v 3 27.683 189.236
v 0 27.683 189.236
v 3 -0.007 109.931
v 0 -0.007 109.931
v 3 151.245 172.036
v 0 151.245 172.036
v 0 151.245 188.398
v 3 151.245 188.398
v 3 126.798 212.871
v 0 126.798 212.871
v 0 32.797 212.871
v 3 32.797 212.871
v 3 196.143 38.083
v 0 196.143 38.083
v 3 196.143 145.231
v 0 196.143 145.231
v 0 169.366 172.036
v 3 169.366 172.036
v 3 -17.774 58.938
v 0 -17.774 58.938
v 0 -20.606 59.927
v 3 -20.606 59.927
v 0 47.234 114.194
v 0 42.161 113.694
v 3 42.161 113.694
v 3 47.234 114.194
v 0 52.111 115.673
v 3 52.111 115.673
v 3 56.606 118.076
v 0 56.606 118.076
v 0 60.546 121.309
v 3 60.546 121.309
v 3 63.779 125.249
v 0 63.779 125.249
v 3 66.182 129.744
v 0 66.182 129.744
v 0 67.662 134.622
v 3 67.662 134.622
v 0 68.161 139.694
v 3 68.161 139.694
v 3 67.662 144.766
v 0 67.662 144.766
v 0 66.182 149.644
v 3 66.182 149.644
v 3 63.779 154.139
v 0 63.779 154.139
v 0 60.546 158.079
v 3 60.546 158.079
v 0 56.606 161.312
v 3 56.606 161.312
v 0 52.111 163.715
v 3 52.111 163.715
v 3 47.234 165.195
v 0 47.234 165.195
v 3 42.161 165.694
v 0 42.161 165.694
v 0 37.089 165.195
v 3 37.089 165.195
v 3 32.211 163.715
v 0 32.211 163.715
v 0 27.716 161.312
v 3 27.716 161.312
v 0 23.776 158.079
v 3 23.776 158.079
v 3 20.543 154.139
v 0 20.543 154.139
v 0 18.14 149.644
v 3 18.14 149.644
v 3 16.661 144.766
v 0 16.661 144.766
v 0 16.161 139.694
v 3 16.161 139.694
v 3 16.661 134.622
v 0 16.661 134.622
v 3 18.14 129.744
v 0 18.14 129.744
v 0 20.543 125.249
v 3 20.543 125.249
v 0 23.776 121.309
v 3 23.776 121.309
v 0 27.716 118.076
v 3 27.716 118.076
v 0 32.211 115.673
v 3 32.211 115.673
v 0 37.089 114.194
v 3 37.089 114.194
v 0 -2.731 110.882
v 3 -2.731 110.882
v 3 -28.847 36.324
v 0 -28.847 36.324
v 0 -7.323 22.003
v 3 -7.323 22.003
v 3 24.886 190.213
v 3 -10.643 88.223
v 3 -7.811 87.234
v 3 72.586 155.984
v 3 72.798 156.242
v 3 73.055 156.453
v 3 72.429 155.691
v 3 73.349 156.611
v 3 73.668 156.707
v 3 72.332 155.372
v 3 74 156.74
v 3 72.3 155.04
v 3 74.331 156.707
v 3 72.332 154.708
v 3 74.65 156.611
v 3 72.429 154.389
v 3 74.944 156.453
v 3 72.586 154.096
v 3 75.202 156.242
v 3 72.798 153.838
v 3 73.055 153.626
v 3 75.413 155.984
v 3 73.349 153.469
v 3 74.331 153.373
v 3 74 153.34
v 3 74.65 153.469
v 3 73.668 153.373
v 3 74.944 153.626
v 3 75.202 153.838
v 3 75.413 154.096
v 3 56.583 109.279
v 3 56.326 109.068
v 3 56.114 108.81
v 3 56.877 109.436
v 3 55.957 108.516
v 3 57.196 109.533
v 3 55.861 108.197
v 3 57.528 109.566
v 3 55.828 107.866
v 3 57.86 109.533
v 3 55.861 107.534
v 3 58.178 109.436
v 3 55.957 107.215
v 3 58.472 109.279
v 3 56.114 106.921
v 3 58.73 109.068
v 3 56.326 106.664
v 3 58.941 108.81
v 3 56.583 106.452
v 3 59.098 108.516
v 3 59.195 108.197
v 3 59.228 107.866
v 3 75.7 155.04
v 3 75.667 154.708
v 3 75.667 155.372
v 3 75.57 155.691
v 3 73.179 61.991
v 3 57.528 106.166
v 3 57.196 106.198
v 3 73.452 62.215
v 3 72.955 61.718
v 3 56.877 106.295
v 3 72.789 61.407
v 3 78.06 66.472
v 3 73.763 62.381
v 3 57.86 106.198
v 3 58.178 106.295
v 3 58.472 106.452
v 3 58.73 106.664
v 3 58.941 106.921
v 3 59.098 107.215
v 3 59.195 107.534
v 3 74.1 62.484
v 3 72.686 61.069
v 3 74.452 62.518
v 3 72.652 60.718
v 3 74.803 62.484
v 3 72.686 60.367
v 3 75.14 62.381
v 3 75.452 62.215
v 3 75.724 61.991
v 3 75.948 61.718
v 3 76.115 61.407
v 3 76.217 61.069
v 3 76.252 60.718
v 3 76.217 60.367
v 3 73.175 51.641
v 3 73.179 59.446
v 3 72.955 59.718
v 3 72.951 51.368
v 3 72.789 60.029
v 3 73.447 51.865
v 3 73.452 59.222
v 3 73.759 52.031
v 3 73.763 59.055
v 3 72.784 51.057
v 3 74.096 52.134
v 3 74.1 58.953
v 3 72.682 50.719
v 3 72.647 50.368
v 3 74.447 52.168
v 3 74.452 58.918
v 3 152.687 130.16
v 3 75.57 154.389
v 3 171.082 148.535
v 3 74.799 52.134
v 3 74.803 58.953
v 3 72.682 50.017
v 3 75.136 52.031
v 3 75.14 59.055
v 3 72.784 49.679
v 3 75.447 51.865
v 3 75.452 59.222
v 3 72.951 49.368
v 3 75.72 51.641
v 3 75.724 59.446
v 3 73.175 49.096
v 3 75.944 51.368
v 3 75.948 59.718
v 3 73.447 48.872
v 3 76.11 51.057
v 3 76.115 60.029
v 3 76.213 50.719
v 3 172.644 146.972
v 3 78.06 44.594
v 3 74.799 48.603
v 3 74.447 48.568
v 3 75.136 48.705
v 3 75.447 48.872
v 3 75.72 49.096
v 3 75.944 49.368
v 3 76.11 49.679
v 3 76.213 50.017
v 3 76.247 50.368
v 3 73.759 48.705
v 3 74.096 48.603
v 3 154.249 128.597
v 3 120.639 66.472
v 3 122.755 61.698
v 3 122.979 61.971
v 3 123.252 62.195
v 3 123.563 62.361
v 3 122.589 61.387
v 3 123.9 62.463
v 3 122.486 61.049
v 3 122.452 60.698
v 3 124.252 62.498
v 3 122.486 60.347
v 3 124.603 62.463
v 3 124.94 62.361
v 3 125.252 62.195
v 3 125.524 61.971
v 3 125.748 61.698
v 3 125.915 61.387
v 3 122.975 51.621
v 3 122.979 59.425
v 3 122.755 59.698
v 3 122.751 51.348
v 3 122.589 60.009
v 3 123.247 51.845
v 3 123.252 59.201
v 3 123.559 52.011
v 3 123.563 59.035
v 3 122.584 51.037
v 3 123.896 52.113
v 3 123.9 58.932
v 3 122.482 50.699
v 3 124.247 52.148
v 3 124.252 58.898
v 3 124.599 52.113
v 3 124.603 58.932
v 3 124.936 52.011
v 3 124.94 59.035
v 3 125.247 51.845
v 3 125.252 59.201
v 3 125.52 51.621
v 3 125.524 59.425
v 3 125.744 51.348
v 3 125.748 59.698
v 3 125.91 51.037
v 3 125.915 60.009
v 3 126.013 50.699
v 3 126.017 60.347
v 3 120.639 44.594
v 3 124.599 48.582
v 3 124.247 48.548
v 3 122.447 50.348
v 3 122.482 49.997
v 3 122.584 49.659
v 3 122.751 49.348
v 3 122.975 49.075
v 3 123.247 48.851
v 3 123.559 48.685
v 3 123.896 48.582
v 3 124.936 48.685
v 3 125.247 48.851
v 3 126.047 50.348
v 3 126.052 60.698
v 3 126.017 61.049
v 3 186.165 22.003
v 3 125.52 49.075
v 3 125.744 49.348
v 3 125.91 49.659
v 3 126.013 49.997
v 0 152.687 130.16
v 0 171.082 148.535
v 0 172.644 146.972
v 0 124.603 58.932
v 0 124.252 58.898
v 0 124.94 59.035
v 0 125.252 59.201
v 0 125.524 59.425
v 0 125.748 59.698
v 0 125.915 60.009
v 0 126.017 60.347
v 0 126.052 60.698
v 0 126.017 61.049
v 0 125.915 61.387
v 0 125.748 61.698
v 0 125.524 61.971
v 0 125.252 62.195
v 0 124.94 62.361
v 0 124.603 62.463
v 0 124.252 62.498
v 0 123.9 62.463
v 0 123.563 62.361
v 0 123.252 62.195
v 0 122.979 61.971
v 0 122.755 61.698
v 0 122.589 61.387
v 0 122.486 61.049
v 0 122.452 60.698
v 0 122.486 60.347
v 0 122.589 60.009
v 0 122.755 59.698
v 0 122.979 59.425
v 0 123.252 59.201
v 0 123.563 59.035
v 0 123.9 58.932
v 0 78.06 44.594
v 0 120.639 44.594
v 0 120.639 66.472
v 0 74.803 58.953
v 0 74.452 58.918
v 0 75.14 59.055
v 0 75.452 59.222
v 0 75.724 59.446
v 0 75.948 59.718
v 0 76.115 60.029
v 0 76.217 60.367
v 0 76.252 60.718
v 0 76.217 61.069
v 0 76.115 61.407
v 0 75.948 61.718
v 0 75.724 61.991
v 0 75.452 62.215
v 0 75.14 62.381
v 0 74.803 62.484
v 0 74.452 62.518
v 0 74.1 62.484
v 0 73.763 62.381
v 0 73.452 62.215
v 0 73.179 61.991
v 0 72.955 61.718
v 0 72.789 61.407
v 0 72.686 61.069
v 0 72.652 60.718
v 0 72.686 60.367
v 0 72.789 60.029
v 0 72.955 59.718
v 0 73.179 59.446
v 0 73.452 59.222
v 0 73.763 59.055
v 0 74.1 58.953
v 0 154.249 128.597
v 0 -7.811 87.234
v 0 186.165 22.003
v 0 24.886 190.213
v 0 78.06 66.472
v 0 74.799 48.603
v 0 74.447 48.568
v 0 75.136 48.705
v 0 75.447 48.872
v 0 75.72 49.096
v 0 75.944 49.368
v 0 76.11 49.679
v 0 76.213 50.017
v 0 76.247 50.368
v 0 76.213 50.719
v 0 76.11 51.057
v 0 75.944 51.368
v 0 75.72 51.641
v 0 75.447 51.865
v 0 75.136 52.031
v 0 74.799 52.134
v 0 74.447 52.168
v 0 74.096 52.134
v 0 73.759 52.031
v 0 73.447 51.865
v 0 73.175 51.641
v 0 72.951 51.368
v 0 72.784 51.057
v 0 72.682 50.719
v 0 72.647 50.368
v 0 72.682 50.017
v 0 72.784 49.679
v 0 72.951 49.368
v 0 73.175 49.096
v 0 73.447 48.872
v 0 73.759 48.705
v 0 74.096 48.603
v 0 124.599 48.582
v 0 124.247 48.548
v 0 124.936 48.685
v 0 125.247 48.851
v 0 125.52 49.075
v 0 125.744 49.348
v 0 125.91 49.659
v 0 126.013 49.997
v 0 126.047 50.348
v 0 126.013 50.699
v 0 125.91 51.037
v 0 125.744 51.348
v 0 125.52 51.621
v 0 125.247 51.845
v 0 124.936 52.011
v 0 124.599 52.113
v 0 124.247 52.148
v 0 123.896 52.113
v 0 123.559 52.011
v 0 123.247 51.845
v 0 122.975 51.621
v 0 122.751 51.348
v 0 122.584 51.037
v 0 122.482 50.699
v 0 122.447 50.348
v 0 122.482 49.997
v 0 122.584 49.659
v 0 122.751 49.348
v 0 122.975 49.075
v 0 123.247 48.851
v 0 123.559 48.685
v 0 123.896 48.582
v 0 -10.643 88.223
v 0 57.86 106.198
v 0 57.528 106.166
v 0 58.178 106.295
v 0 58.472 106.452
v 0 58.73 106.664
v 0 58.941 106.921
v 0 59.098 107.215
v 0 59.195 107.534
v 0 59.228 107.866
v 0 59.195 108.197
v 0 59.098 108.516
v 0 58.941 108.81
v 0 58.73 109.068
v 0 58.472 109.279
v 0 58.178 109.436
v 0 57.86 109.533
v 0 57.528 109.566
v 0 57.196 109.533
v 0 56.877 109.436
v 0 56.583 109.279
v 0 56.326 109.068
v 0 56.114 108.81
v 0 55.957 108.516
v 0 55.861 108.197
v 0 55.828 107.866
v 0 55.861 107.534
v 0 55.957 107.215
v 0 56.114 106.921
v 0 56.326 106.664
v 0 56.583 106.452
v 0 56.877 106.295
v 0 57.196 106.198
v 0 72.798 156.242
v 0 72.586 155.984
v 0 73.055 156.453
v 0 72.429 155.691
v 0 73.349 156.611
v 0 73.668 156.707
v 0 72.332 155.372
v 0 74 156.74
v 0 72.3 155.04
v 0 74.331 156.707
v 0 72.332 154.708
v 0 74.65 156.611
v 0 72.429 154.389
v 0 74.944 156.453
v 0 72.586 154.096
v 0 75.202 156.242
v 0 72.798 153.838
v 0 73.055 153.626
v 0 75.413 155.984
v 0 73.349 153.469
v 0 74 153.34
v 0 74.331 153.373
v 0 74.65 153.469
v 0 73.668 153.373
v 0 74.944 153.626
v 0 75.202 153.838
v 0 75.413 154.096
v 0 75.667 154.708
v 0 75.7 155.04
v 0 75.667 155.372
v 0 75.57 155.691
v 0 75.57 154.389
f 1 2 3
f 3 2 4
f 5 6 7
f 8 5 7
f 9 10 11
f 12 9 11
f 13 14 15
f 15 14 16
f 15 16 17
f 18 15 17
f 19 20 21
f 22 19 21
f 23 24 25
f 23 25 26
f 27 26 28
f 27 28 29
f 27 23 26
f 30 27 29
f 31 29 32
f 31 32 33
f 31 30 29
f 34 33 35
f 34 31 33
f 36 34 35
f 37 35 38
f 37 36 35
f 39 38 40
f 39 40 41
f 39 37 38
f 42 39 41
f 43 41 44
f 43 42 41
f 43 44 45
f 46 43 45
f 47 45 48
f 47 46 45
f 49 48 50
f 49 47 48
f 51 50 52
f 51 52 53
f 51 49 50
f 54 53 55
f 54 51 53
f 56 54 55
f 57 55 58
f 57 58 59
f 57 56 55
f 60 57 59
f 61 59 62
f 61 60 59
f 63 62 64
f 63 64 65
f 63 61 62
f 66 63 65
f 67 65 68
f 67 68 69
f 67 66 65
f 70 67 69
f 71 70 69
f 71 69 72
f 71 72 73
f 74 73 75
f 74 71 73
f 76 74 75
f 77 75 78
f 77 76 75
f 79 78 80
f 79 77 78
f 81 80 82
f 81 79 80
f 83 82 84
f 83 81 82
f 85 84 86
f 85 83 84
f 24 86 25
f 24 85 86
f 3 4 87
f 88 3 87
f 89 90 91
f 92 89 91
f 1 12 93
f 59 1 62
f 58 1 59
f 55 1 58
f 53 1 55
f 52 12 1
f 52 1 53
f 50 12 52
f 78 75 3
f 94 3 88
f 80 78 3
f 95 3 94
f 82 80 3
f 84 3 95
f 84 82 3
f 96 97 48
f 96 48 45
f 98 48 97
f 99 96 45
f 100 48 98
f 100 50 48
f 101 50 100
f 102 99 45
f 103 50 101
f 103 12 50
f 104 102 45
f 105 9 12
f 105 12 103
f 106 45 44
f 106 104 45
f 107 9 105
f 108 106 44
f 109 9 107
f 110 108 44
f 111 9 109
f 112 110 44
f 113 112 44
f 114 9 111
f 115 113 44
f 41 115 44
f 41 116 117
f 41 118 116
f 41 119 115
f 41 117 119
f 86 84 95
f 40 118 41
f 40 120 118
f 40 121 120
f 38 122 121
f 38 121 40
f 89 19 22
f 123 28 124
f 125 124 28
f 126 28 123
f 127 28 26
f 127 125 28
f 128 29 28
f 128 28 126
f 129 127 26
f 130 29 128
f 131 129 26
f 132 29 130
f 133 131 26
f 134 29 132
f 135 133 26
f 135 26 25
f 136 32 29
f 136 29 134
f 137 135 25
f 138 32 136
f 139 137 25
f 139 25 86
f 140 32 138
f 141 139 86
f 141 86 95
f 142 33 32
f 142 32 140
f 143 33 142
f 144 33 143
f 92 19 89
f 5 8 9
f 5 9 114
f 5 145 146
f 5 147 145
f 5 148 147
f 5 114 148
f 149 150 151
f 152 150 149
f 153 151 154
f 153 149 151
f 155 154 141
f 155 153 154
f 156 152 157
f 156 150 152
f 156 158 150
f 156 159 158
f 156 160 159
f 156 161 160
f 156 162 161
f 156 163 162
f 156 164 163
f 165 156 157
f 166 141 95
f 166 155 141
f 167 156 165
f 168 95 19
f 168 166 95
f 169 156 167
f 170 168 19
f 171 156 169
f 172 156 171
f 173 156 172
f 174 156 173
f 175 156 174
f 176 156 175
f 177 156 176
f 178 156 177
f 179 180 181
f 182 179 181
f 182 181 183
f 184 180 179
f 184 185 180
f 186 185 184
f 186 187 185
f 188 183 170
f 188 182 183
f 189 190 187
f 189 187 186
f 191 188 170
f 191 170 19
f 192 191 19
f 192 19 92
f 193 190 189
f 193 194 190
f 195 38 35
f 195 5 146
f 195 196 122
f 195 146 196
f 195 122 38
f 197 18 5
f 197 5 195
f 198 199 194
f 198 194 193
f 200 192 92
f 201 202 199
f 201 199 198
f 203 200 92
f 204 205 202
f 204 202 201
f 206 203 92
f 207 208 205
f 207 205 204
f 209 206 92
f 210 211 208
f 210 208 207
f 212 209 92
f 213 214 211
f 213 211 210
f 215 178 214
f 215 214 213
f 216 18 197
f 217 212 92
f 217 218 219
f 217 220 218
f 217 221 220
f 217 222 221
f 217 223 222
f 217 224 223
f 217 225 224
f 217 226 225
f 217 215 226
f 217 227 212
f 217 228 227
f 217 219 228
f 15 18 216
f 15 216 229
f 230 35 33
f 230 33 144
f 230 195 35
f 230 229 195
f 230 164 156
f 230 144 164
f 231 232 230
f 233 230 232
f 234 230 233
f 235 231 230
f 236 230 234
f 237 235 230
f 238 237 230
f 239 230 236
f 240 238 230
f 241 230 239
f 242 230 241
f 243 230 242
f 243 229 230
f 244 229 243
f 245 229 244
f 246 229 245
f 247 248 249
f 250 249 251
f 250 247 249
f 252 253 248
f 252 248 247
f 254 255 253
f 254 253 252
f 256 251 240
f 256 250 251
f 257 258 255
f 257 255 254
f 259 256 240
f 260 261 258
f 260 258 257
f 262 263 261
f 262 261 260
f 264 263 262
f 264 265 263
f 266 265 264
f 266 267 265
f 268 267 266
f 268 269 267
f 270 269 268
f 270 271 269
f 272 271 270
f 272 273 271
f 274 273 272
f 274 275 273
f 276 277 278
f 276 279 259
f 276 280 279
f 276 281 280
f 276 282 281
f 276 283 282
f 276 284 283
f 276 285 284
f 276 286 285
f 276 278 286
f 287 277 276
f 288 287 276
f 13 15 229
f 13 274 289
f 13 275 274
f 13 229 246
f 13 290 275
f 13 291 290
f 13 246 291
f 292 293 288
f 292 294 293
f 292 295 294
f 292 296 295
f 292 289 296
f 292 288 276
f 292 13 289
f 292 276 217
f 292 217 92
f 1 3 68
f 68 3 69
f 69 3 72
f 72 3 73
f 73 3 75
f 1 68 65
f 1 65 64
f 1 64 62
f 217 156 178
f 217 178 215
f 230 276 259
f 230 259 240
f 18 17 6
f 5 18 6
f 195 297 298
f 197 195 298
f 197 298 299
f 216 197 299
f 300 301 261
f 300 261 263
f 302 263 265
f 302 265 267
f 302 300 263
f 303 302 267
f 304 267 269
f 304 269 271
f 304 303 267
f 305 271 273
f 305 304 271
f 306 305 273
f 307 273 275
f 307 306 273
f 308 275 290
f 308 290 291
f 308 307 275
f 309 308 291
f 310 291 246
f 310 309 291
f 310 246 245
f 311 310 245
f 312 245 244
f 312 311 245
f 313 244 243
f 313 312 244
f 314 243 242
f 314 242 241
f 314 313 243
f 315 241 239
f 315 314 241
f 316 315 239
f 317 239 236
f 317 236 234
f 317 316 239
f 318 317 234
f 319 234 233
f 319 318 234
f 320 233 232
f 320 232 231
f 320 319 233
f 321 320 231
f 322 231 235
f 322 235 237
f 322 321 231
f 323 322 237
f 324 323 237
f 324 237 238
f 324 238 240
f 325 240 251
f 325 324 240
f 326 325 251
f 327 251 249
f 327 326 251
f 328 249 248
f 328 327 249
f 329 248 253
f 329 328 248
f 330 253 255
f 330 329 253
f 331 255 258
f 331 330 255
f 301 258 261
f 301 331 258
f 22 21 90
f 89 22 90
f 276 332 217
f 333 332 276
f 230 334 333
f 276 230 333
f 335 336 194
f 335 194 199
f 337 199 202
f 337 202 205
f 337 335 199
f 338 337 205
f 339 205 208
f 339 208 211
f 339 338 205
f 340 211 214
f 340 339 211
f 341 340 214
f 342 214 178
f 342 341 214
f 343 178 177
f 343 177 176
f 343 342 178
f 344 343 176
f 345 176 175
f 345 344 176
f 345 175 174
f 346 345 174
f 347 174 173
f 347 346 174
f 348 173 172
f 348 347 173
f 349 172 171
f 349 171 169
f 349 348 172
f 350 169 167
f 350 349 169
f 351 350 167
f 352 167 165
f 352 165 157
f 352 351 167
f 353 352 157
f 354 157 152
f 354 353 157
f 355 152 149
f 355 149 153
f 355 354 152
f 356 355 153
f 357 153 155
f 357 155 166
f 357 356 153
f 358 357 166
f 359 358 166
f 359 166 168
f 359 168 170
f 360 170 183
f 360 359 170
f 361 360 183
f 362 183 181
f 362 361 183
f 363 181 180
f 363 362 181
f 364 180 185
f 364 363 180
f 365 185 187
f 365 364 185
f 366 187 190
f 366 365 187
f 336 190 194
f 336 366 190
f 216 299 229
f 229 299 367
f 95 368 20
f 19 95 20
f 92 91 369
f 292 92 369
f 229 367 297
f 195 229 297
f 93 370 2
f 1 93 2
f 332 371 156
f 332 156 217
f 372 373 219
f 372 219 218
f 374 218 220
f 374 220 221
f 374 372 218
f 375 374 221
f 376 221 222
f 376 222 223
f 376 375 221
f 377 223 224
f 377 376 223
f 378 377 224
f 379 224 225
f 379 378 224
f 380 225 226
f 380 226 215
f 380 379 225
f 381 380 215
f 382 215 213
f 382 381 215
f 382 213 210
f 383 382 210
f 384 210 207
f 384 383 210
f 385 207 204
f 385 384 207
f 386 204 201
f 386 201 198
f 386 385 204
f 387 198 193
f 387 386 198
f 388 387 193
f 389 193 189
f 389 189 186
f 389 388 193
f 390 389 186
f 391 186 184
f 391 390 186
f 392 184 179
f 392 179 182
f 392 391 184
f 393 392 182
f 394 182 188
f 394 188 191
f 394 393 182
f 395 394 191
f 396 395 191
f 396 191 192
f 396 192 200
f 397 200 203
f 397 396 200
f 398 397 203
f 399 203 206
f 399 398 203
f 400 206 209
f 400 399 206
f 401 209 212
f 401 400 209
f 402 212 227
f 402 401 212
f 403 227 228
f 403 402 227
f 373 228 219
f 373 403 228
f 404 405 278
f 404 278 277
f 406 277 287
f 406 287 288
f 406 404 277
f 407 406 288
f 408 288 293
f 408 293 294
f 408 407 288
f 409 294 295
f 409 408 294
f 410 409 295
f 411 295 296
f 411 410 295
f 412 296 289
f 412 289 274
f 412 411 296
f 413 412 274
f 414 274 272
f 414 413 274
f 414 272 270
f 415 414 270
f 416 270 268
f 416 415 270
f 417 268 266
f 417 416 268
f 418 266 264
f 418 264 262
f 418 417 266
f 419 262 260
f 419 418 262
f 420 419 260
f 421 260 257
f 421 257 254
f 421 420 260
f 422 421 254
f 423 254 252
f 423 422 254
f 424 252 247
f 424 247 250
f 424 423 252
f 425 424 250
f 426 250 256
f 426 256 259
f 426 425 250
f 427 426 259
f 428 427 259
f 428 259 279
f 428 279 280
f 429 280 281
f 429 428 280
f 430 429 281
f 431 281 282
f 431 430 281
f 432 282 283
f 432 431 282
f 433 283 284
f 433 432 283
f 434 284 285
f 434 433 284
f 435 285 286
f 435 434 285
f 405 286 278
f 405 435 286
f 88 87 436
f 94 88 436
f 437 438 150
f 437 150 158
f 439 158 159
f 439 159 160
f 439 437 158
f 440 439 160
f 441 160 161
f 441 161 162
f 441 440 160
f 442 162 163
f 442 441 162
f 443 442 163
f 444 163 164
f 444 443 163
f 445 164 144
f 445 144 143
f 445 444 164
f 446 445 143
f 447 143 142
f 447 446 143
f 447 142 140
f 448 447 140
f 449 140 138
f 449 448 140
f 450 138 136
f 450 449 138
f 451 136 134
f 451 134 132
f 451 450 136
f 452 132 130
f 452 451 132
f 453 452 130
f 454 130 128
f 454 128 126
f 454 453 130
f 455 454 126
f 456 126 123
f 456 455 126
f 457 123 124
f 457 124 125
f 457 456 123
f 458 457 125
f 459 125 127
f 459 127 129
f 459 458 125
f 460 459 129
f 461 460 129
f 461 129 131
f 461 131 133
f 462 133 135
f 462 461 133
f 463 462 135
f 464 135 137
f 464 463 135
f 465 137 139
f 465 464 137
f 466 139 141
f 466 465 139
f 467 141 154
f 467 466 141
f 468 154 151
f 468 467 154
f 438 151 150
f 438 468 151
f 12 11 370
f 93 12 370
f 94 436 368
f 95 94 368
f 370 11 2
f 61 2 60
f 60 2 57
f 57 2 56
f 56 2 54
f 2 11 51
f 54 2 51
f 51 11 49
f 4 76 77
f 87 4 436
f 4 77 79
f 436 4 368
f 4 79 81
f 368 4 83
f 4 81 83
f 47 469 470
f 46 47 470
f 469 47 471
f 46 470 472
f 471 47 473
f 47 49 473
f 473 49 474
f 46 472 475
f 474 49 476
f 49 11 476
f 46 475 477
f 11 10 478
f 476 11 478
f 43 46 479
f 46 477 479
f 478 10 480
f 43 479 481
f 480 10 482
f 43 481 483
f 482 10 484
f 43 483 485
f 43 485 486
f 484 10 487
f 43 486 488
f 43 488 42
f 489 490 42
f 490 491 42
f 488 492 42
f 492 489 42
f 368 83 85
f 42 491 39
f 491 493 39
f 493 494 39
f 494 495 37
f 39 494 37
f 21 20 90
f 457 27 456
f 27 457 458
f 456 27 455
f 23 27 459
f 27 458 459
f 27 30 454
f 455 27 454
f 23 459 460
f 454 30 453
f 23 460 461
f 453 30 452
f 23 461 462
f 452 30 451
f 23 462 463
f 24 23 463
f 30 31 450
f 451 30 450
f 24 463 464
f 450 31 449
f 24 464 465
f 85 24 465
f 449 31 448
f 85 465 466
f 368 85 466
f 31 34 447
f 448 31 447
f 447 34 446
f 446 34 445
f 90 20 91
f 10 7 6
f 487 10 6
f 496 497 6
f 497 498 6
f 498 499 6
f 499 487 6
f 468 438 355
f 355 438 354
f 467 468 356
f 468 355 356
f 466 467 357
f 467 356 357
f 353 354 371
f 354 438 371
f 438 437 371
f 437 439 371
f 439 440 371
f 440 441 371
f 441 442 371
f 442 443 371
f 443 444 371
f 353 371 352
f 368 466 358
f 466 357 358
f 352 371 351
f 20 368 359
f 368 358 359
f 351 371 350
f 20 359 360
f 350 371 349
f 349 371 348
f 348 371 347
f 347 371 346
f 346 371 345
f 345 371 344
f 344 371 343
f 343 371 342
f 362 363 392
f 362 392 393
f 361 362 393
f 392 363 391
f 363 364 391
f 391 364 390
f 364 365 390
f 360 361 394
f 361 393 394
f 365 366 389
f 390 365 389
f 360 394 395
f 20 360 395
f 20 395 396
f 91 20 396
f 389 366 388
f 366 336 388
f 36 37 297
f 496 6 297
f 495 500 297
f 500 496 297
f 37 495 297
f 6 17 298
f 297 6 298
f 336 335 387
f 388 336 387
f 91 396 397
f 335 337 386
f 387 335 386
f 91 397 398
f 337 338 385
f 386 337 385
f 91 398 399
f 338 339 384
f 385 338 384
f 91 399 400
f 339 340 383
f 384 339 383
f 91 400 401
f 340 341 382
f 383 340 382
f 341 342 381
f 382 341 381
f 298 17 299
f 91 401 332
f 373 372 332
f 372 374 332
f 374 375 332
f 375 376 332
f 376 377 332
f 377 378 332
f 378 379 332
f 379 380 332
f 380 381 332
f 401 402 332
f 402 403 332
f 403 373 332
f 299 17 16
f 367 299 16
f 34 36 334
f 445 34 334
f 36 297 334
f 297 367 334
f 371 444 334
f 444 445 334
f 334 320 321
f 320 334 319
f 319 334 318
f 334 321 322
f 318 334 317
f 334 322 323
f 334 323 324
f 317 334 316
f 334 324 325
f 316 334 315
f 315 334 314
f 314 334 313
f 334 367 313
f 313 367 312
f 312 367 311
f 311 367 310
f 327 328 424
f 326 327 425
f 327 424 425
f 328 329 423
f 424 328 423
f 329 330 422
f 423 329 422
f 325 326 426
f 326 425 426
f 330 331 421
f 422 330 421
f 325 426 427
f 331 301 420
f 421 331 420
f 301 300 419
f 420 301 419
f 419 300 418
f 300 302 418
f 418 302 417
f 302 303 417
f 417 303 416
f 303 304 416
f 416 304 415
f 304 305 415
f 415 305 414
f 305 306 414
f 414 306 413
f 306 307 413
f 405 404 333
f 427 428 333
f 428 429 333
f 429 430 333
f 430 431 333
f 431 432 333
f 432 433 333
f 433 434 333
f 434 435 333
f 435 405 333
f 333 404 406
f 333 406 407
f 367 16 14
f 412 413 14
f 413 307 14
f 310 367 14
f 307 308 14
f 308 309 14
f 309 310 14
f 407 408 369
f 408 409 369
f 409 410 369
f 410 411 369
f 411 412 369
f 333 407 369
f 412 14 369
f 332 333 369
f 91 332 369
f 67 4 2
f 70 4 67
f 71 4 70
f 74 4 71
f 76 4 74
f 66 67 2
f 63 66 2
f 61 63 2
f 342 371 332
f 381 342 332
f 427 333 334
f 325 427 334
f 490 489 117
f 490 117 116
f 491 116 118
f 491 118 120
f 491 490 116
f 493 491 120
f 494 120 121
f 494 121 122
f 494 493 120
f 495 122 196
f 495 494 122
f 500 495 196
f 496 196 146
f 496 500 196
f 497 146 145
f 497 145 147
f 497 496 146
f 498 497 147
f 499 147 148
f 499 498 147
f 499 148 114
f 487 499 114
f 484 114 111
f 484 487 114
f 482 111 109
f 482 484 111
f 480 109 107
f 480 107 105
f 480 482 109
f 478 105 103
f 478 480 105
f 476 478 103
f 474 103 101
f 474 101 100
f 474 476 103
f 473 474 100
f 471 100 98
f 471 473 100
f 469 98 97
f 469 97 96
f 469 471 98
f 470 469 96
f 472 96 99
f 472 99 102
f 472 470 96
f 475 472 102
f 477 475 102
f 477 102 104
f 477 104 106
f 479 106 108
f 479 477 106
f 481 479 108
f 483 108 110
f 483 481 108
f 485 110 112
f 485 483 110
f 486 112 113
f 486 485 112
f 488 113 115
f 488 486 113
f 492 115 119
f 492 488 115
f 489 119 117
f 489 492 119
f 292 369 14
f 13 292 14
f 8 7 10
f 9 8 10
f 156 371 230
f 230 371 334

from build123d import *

# Parameters (mm, degrees)
SKETCH1_R           = 1.7
SKETCH1_R_2         = 26
SKETCH1_R_3         = 1.8
SKETCH1_W           = 21.878233713
SKETCH1_H           = 42.578781785
BOSS_EXTRUDE1_DEPTH = 3


with BuildPart() as part:
    # Sketch1 → Boss-Extrude1 (new body)
    with BuildSketch(Plane(origin=(0, 0, 0), x_dir=(0, 0, -1), z_dir=(1, 0, 0))):
        Polygon((-110.882382617, -2.731166398), (-88.223157403, -10.643032479), (-87.23420686, -7.810723029), (-58.937631543, -17.77378609), (-59.926582085, -20.606095541), (-36.324038311, -28.84733785), (-22.003393348, -7.322703446), (-22.003393348, 186.164699152), (-38.083447414, 196.14277913), (-145.230517161, 196.14277913), (-172.036164941, 169.366182911), (-172.036164941, 151.244509979), (-188.398196234, 151.244509979), (-212.871297543, 126.797932251), (-212.871297543, 32.797235558), (-190.212821939, 24.885631216), (-189.235943541, 27.683366592), (-109.931278924, -0.007248606), align=None)
        with Locations((-155.039998164, 73.999598468)):
            Circle(SKETCH1_R, mode=Mode.SUBTRACT)
        with Locations((-107.865704399, 57.52786604)):
            Circle(SKETCH1_R, mode=Mode.SUBTRACT)
        with Locations((-139.694105805, 42.161153499)):
            Circle(SKETCH1_R_2, mode=Mode.SUBTRACT)
        with Locations((-60.718323374, 74.451599653)):
            Circle(SKETCH1_R_3, mode=Mode.SUBTRACT)
        with Locations((-50.368324245, 74.447353909)):
            Circle(SKETCH1_R_3, mode=Mode.SUBTRACT)
        with Locations((-60.697894576, 124.251595463)):
            Circle(SKETCH1_R_3, mode=Mode.SUBTRACT)
        with Locations((-50.347895446, 124.247349719)):
            Circle(SKETCH1_R_3, mode=Mode.SUBTRACT)
        Polygon((-148.535091588, 171.081773838), (-146.971590994, 172.643579934), (-128.596785358, 154.248838352), (-130.160285952, 152.687032257), align=None, mode=Mode.SUBTRACT)
        with Locations((-55.533109411, 99.349474686)):
            Rectangle(SKETCH1_W, SKETCH1_H, mode=Mode.SUBTRACT)
    extrude(amount=BOSS_EXTRUDE1_DEPTH)


solid = part.part
